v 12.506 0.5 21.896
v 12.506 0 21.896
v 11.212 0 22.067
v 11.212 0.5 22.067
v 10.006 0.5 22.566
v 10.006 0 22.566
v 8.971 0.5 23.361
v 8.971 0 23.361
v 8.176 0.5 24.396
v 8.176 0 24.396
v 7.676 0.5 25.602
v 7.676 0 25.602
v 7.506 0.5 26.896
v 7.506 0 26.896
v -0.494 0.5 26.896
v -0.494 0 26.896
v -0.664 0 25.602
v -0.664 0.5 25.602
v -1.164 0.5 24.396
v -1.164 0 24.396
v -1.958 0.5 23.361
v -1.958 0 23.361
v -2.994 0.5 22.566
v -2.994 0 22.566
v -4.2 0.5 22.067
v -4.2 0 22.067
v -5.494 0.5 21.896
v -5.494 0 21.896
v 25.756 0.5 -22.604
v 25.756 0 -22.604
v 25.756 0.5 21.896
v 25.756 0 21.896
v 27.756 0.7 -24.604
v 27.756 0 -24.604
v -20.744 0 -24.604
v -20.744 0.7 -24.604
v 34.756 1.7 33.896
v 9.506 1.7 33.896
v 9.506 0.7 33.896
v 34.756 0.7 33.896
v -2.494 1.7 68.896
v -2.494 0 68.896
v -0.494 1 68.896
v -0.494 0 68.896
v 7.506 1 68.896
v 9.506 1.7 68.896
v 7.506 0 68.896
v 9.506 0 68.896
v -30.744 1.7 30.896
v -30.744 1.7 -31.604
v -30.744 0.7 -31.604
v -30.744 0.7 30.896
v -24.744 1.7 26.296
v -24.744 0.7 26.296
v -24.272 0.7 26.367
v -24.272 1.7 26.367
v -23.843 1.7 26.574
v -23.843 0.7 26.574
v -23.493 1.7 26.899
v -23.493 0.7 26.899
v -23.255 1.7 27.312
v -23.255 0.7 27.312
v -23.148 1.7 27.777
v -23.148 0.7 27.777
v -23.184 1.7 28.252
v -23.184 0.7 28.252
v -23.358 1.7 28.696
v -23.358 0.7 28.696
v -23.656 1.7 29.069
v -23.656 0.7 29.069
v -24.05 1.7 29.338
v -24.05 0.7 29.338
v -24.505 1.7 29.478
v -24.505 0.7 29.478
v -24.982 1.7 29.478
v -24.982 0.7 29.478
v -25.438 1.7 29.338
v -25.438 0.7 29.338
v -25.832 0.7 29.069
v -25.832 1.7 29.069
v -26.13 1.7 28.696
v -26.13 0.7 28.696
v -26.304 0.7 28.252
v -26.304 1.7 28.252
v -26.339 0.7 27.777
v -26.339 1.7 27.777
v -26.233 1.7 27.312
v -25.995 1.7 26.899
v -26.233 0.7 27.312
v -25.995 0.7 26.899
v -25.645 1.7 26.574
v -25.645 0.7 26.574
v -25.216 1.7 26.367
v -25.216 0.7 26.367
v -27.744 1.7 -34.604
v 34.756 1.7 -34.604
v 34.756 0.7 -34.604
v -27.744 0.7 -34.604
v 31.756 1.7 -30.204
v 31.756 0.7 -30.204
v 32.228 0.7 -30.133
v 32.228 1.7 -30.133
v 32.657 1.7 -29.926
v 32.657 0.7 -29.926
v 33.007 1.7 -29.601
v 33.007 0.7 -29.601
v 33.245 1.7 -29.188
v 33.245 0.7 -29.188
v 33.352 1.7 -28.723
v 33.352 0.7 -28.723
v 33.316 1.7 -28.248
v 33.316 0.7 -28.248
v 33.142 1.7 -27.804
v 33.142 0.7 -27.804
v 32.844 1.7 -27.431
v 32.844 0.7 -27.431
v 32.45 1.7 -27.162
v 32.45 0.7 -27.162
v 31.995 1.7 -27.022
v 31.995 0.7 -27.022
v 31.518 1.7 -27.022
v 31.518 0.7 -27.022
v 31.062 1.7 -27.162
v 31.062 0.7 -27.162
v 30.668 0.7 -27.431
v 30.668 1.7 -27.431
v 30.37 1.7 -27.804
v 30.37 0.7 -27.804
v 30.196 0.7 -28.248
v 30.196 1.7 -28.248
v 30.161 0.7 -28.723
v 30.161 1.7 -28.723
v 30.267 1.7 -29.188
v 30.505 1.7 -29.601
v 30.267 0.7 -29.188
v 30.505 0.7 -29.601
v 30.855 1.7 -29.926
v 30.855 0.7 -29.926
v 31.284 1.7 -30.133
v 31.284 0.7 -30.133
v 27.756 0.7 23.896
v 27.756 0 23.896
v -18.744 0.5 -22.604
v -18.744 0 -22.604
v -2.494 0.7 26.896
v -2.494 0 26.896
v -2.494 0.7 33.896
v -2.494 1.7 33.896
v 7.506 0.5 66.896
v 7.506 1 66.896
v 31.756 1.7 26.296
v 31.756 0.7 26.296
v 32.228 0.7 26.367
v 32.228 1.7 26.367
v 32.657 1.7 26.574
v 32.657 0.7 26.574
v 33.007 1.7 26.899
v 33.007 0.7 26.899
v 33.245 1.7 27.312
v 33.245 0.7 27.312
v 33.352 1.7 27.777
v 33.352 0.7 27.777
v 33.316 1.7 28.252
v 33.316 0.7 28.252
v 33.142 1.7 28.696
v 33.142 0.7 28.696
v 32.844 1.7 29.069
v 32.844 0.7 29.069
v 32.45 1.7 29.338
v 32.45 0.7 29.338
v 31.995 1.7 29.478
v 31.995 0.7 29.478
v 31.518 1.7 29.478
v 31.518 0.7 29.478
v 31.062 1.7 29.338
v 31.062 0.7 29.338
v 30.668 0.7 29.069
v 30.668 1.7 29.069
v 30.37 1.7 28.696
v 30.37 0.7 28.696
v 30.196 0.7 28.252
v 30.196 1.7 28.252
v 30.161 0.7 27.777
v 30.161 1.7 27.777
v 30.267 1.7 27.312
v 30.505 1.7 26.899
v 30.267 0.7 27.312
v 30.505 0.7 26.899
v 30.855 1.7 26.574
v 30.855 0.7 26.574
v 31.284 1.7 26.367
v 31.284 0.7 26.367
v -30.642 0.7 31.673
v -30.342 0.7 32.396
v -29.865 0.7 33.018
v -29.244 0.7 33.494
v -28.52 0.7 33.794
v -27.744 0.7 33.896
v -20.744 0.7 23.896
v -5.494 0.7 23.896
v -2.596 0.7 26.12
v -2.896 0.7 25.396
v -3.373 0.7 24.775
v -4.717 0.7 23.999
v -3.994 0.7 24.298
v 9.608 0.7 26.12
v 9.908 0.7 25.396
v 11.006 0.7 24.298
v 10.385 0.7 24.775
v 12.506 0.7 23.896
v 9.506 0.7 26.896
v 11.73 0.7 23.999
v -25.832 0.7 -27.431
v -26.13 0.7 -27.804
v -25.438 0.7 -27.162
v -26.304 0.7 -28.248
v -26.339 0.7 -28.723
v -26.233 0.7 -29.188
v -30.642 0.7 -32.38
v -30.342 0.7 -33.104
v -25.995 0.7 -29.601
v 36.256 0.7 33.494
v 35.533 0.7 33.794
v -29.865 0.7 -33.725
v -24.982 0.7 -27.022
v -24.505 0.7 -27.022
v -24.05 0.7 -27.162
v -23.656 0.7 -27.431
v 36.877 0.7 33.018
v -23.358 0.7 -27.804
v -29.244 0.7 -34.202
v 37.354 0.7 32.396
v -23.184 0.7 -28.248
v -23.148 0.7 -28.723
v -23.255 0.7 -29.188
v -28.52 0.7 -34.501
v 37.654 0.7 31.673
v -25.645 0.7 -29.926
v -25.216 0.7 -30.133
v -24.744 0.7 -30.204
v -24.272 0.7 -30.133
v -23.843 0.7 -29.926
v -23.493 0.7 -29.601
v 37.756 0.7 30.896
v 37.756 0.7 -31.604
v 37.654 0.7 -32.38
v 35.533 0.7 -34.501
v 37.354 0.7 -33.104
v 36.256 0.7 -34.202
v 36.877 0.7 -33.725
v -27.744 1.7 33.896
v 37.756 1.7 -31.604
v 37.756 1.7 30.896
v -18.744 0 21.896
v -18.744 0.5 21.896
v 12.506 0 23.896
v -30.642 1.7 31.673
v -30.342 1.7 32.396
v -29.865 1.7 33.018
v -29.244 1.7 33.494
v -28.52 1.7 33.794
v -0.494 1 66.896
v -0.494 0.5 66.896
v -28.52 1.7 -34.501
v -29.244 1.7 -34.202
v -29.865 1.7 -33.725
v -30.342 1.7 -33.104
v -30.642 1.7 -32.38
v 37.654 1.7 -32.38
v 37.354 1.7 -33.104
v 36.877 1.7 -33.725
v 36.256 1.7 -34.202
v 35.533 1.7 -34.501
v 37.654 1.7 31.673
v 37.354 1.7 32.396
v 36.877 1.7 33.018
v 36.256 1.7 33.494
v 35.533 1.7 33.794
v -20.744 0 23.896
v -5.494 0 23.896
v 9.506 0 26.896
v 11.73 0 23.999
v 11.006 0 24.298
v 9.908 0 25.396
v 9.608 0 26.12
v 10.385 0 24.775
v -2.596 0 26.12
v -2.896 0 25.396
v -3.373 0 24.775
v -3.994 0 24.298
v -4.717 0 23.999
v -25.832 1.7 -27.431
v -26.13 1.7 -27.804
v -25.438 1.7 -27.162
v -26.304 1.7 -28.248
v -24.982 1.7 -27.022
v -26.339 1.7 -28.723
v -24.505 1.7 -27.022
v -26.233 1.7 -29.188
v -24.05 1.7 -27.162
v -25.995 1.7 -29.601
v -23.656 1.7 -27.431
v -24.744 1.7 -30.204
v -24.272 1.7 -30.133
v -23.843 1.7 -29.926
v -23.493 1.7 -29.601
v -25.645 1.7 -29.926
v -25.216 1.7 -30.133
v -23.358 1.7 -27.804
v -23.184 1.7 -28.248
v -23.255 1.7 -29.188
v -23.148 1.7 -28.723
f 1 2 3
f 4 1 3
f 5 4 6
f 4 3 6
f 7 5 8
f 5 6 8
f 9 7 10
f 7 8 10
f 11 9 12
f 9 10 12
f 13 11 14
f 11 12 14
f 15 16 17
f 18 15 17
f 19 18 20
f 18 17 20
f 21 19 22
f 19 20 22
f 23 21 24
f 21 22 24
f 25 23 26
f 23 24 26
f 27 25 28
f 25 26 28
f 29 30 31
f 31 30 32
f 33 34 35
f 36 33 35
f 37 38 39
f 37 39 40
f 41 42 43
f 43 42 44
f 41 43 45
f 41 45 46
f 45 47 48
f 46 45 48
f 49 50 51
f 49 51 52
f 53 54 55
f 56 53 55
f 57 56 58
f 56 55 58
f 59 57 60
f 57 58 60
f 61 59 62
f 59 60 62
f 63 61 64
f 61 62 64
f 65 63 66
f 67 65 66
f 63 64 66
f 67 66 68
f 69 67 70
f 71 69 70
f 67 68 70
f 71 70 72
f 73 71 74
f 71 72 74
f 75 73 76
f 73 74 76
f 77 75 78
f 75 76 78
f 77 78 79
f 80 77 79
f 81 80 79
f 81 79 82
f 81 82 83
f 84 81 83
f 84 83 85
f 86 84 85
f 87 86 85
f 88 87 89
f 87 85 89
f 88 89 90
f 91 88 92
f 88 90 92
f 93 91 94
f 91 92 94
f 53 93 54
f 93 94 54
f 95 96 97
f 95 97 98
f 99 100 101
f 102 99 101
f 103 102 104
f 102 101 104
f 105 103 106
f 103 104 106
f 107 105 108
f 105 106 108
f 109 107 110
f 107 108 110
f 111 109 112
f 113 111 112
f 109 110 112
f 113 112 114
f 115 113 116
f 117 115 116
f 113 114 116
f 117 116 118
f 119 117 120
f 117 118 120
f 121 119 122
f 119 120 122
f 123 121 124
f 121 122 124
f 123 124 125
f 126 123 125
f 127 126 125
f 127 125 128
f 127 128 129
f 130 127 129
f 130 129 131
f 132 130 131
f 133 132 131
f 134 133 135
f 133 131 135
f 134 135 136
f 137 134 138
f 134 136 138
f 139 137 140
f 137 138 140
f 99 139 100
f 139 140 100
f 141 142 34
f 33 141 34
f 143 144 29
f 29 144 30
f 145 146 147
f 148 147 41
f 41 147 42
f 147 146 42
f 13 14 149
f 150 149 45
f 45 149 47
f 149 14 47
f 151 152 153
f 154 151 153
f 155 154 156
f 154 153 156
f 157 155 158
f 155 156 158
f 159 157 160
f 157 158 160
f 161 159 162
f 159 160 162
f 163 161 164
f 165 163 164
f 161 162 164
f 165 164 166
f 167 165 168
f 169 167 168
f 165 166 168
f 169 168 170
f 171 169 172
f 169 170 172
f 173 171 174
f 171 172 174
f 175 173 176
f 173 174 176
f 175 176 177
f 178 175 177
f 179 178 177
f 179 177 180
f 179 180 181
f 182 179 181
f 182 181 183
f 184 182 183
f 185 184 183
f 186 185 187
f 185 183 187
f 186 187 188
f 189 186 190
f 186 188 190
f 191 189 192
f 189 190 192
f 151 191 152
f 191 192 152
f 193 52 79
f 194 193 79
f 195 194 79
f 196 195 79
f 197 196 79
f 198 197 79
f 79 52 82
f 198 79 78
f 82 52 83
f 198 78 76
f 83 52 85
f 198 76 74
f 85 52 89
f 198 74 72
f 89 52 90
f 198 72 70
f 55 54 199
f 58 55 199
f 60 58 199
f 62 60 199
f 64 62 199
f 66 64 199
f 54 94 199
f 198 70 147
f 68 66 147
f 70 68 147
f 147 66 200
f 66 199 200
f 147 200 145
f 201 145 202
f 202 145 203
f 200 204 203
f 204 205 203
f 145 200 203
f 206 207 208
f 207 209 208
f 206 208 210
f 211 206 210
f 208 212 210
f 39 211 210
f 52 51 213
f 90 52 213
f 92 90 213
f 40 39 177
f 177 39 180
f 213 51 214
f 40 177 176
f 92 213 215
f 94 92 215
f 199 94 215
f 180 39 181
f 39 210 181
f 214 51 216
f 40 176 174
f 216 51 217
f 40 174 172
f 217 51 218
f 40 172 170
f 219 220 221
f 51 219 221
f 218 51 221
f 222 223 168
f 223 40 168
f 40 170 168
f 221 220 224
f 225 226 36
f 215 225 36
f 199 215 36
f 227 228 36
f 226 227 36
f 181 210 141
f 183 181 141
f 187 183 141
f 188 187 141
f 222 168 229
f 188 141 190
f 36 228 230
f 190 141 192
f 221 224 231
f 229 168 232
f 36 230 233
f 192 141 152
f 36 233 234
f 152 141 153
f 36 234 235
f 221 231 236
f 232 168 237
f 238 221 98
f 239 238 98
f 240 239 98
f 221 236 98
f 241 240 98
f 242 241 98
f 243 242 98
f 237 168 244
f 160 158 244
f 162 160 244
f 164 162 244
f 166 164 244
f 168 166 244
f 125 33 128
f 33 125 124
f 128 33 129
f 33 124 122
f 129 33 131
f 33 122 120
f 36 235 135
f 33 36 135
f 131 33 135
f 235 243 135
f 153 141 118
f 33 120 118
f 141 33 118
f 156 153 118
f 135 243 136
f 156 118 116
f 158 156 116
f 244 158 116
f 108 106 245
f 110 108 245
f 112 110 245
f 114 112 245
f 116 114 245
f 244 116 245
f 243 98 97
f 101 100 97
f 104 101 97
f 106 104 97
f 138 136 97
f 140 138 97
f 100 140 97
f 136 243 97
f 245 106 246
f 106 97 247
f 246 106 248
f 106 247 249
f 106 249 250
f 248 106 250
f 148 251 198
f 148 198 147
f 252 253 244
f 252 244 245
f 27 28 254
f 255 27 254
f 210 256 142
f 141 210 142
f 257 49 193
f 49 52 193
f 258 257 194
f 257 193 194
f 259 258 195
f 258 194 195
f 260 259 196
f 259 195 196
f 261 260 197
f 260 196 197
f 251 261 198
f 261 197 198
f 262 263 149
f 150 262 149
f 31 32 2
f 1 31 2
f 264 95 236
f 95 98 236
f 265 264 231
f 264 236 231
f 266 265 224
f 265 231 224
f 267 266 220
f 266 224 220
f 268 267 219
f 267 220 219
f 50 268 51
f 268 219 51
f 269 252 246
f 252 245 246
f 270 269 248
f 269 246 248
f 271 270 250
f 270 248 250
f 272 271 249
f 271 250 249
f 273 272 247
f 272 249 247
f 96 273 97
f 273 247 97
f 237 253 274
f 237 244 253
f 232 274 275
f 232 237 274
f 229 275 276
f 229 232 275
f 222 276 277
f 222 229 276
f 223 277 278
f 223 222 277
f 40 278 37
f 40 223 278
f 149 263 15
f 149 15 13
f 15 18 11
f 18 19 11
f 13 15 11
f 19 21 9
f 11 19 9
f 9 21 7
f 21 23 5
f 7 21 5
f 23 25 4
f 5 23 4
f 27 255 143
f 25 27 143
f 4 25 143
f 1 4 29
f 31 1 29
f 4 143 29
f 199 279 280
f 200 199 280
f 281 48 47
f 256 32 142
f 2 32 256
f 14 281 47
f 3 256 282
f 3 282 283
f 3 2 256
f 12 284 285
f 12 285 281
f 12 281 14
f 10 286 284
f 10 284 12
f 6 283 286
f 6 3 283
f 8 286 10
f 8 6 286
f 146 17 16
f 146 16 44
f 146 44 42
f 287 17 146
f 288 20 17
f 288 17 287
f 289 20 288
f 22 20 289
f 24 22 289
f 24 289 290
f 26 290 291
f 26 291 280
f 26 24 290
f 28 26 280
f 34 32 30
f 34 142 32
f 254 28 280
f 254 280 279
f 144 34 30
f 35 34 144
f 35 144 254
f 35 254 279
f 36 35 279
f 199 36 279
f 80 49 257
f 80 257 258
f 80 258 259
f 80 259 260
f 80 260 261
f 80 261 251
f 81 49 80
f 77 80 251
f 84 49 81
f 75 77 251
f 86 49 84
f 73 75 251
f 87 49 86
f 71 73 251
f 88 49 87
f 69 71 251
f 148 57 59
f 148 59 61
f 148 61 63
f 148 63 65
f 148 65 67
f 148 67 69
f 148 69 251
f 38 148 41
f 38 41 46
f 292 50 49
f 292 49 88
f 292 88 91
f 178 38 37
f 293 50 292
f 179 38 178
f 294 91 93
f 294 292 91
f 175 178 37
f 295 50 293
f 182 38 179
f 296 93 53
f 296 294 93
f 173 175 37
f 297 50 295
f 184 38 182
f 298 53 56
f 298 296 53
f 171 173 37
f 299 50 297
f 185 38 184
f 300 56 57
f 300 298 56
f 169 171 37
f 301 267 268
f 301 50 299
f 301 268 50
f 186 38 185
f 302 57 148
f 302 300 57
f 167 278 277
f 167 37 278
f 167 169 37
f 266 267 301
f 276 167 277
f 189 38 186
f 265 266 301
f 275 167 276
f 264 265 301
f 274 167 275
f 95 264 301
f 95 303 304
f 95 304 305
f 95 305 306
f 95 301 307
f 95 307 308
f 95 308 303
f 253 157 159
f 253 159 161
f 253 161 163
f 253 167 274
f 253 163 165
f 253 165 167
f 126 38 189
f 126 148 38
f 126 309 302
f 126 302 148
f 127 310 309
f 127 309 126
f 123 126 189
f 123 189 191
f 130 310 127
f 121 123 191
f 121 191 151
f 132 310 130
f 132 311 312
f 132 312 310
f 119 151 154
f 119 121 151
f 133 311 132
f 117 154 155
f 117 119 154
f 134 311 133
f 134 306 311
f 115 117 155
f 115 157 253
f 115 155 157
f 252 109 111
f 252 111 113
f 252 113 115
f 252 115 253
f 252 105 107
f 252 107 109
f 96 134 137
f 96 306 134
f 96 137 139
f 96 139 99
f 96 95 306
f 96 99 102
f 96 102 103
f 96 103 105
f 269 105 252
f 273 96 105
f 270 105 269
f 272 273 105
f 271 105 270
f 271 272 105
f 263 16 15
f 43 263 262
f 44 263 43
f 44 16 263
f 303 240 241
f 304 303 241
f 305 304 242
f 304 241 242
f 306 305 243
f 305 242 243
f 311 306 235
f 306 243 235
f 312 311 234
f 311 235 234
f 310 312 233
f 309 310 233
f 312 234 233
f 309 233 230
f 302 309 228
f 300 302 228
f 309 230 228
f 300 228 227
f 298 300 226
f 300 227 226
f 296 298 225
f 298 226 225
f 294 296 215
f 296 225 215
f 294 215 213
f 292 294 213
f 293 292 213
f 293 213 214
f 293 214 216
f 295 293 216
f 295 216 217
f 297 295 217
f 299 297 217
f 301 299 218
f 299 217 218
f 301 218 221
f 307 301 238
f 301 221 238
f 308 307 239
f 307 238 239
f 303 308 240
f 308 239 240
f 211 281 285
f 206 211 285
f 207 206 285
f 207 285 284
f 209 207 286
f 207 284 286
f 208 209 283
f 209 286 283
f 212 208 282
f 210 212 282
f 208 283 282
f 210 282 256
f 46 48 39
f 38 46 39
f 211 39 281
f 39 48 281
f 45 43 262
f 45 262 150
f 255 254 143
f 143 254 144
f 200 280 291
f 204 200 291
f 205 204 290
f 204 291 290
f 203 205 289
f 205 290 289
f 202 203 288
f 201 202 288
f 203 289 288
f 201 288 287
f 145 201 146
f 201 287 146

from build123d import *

# Parameters (mm, degrees)
BOSS_EXTRUDE1_DEPTH = 0.5
BOSS_EXTRUDE2_DEPTH = 1.2
SKETCH3_W           = 8
SKETCH3_H           = 2
CUT_EXTRUDE1_DEPTH  = 1
BOSS_EXTRUDE3_DEPTH = 1
FILLET1_R           = 3
SKETCH5_R           = 1.6
CUT_EXTRUDE2_DEPTH  = 1


with BuildPart() as part:
    # Sketch1 → Boss-Extrude1 (new body)
    with BuildSketch(Plane(origin=(0, 0, 0), x_dir=(1, 0, 0), z_dir=(0, 1, 0))):
        with BuildLine():
            Line((-20.743902439, 24.603658537), (27.756097561, 24.603658537))
            Line((27.756097561, 24.603658537), (27.756097561, -23.896341463))
            Line((27.756097561, -23.896341463), (12.506097561, -23.896341463))
            ThreePointArc((12.506097561, -23.896341463), (10.384777217, -24.77502112), (9.506097561, -26.896341463))
            Line((9.506097561, -26.896341463), (9.506097561, -68.896341463))
            Line((9.506097561, -68.896341463), (-2.493902439, -68.896341463))
            Line((-2.493902439, -68.896341463), (-2.493902439, -26.896341463))
            ThreePointArc((-2.493902439, -26.896341463), (-3.372582095, -24.77502112), (-5.493902439, -23.896341463))
            Line((-5.493902439, -23.896341463), (-20.743902439, -23.896341463))
            Line((-20.743902439, -23.896341463), (-20.743902439, 24.603658537))
        make_face()
        with BuildLine():
            Line((-18.743902439, 22.603658537), (25.756097561, 22.603658537))
            Line((25.756097561, 22.603658537), (25.756097561, -21.896341463))
            Line((25.756097561, -21.896341463), (12.506097561, -21.896341463))
            ThreePointArc((12.506097561, -21.896341463), (8.970563655, -23.360807557), (7.506097561, -26.896341463))
            Line((7.506097561, -26.896341463), (7.506097561, -66.896341463))
            Line((7.506097561, -66.896341463), (-0.493902439, -66.896341463))
            Line((-0.493902439, -66.896341463), (-0.493902439, -26.896341463))
            ThreePointArc((-0.493902439, -26.896341463), (-1.958368533, -23.360807557), (-5.493902439, -21.896341463))
            Line((-5.493902439, -21.896341463), (-18.743902439, -21.896341463))
            Line((-18.743902439, -21.896341463), (-18.743902439, 22.603658537))
        make_face(mode=Mode.SUBTRACT)
    extrude(amount=BOSS_EXTRUDE1_DEPTH)

    # Sketch2 → Boss-Extrude2 (add)
    with BuildSketch(Plane(origin=(0, 0.5, 0), x_dir=(1, 0, 0), z_dir=(0, 1, 0))):
        with BuildLine():
            Line((-20.743902439, 24.603658537), (-20.743902439, -23.896341463))
            Line((-20.743902439, -23.896341463), (-5.493902439, -23.896341463))
            ThreePointArc((-5.493902439, -23.896341463), (-3.372582095, -24.77502112), (-2.493902439, -26.896341463))
            Line((-2.493902439, -26.896341463), (-2.493902439, -68.896341463))
            Line((-2.493902439, -68.896341463), (9.506097561, -68.896341463))
            Line((9.506097561, -68.896341463), (9.506097561, -26.896341463))
            ThreePointArc((9.506097561, -26.896341463), (10.384777217, -24.77502112), (12.506097561, -23.896341463))
            Line((12.506097561, -23.896341463), (27.756097561, -23.896341463))
            Line((27.756097561, -23.896341463), (27.756097561, 24.603658537))
            Line((27.756097561, 24.603658537), (-20.743902439, 24.603658537))
        make_face()
    extrude(amount=BOSS_EXTRUDE2_DEPTH)

    # Sketch3 → Cut-Extrude1 (cut)
    with BuildSketch(Plane.XZ):
        with Locations((3.506097561, 67.896341463)):
            Rectangle(SKETCH3_W, SKETCH3_H)
    extrude(amount=-CUT_EXTRUDE1_DEPTH, mode=Mode.SUBTRACT)

    # Sketch4 → Boss-Extrude3 (add)
    with BuildSketch(Plane(origin=(0, 1.7, 0), x_dir=(1, 0, 0), z_dir=(0, 1, 0))):
        Polygon((-12.493902439, -33.896341463), (19.506097561, -33.896341463), (37.756097561, -33.896341463), (37.756097561, 34.603658537), (-30.743902439, 34.603658537), (-30.743902439, -33.896341463), align=None)
    extrude(amount=-BOSS_EXTRUDE3_DEPTH)

    # Fillet1
    fillet1_edges = [part.edges().sort_by_distance(p)[0] for p in [
        (37.756097561, 1.2, 33.896341463),
        (37.756097561, 1.2, -34.603658537),
        (-30.743902439, 1.2, 33.896341463),
        (-30.743902439, 1.2, -34.603658537),
    ]]
    fillet(fillet1_edges, radius=FILLET1_R)

    # Sketch5 → Cut-Extrude2 (cut)
    with BuildSketch(Plane.XZ.offset(-0.7)):
        with Locations(Location((-24.743902439, 27.896341463, 0), (0, 0, 270))):  # turned: the seam where the file's is
            Circle(SKETCH5_R)
        with Locations(Location((31.756097561, 27.896341463, 0), (0, 0, 270))):  # turned: the seam where the file's is
            Circle(SKETCH5_R)
        with Locations(Location((31.756097561, -28.603658537, 0), (0, 0, 270))):  # turned: the seam where the file's is
            Circle(SKETCH5_R)
        with Locations(Location((-24.743902439, -28.603658537, 0), (0, 0, 270))):  # turned: the seam where the file's is
            Circle(SKETCH5_R)
    extrude(amount=-CUT_EXTRUDE2_DEPTH, mode=Mode.SUBTRACT)


solid = part.part
